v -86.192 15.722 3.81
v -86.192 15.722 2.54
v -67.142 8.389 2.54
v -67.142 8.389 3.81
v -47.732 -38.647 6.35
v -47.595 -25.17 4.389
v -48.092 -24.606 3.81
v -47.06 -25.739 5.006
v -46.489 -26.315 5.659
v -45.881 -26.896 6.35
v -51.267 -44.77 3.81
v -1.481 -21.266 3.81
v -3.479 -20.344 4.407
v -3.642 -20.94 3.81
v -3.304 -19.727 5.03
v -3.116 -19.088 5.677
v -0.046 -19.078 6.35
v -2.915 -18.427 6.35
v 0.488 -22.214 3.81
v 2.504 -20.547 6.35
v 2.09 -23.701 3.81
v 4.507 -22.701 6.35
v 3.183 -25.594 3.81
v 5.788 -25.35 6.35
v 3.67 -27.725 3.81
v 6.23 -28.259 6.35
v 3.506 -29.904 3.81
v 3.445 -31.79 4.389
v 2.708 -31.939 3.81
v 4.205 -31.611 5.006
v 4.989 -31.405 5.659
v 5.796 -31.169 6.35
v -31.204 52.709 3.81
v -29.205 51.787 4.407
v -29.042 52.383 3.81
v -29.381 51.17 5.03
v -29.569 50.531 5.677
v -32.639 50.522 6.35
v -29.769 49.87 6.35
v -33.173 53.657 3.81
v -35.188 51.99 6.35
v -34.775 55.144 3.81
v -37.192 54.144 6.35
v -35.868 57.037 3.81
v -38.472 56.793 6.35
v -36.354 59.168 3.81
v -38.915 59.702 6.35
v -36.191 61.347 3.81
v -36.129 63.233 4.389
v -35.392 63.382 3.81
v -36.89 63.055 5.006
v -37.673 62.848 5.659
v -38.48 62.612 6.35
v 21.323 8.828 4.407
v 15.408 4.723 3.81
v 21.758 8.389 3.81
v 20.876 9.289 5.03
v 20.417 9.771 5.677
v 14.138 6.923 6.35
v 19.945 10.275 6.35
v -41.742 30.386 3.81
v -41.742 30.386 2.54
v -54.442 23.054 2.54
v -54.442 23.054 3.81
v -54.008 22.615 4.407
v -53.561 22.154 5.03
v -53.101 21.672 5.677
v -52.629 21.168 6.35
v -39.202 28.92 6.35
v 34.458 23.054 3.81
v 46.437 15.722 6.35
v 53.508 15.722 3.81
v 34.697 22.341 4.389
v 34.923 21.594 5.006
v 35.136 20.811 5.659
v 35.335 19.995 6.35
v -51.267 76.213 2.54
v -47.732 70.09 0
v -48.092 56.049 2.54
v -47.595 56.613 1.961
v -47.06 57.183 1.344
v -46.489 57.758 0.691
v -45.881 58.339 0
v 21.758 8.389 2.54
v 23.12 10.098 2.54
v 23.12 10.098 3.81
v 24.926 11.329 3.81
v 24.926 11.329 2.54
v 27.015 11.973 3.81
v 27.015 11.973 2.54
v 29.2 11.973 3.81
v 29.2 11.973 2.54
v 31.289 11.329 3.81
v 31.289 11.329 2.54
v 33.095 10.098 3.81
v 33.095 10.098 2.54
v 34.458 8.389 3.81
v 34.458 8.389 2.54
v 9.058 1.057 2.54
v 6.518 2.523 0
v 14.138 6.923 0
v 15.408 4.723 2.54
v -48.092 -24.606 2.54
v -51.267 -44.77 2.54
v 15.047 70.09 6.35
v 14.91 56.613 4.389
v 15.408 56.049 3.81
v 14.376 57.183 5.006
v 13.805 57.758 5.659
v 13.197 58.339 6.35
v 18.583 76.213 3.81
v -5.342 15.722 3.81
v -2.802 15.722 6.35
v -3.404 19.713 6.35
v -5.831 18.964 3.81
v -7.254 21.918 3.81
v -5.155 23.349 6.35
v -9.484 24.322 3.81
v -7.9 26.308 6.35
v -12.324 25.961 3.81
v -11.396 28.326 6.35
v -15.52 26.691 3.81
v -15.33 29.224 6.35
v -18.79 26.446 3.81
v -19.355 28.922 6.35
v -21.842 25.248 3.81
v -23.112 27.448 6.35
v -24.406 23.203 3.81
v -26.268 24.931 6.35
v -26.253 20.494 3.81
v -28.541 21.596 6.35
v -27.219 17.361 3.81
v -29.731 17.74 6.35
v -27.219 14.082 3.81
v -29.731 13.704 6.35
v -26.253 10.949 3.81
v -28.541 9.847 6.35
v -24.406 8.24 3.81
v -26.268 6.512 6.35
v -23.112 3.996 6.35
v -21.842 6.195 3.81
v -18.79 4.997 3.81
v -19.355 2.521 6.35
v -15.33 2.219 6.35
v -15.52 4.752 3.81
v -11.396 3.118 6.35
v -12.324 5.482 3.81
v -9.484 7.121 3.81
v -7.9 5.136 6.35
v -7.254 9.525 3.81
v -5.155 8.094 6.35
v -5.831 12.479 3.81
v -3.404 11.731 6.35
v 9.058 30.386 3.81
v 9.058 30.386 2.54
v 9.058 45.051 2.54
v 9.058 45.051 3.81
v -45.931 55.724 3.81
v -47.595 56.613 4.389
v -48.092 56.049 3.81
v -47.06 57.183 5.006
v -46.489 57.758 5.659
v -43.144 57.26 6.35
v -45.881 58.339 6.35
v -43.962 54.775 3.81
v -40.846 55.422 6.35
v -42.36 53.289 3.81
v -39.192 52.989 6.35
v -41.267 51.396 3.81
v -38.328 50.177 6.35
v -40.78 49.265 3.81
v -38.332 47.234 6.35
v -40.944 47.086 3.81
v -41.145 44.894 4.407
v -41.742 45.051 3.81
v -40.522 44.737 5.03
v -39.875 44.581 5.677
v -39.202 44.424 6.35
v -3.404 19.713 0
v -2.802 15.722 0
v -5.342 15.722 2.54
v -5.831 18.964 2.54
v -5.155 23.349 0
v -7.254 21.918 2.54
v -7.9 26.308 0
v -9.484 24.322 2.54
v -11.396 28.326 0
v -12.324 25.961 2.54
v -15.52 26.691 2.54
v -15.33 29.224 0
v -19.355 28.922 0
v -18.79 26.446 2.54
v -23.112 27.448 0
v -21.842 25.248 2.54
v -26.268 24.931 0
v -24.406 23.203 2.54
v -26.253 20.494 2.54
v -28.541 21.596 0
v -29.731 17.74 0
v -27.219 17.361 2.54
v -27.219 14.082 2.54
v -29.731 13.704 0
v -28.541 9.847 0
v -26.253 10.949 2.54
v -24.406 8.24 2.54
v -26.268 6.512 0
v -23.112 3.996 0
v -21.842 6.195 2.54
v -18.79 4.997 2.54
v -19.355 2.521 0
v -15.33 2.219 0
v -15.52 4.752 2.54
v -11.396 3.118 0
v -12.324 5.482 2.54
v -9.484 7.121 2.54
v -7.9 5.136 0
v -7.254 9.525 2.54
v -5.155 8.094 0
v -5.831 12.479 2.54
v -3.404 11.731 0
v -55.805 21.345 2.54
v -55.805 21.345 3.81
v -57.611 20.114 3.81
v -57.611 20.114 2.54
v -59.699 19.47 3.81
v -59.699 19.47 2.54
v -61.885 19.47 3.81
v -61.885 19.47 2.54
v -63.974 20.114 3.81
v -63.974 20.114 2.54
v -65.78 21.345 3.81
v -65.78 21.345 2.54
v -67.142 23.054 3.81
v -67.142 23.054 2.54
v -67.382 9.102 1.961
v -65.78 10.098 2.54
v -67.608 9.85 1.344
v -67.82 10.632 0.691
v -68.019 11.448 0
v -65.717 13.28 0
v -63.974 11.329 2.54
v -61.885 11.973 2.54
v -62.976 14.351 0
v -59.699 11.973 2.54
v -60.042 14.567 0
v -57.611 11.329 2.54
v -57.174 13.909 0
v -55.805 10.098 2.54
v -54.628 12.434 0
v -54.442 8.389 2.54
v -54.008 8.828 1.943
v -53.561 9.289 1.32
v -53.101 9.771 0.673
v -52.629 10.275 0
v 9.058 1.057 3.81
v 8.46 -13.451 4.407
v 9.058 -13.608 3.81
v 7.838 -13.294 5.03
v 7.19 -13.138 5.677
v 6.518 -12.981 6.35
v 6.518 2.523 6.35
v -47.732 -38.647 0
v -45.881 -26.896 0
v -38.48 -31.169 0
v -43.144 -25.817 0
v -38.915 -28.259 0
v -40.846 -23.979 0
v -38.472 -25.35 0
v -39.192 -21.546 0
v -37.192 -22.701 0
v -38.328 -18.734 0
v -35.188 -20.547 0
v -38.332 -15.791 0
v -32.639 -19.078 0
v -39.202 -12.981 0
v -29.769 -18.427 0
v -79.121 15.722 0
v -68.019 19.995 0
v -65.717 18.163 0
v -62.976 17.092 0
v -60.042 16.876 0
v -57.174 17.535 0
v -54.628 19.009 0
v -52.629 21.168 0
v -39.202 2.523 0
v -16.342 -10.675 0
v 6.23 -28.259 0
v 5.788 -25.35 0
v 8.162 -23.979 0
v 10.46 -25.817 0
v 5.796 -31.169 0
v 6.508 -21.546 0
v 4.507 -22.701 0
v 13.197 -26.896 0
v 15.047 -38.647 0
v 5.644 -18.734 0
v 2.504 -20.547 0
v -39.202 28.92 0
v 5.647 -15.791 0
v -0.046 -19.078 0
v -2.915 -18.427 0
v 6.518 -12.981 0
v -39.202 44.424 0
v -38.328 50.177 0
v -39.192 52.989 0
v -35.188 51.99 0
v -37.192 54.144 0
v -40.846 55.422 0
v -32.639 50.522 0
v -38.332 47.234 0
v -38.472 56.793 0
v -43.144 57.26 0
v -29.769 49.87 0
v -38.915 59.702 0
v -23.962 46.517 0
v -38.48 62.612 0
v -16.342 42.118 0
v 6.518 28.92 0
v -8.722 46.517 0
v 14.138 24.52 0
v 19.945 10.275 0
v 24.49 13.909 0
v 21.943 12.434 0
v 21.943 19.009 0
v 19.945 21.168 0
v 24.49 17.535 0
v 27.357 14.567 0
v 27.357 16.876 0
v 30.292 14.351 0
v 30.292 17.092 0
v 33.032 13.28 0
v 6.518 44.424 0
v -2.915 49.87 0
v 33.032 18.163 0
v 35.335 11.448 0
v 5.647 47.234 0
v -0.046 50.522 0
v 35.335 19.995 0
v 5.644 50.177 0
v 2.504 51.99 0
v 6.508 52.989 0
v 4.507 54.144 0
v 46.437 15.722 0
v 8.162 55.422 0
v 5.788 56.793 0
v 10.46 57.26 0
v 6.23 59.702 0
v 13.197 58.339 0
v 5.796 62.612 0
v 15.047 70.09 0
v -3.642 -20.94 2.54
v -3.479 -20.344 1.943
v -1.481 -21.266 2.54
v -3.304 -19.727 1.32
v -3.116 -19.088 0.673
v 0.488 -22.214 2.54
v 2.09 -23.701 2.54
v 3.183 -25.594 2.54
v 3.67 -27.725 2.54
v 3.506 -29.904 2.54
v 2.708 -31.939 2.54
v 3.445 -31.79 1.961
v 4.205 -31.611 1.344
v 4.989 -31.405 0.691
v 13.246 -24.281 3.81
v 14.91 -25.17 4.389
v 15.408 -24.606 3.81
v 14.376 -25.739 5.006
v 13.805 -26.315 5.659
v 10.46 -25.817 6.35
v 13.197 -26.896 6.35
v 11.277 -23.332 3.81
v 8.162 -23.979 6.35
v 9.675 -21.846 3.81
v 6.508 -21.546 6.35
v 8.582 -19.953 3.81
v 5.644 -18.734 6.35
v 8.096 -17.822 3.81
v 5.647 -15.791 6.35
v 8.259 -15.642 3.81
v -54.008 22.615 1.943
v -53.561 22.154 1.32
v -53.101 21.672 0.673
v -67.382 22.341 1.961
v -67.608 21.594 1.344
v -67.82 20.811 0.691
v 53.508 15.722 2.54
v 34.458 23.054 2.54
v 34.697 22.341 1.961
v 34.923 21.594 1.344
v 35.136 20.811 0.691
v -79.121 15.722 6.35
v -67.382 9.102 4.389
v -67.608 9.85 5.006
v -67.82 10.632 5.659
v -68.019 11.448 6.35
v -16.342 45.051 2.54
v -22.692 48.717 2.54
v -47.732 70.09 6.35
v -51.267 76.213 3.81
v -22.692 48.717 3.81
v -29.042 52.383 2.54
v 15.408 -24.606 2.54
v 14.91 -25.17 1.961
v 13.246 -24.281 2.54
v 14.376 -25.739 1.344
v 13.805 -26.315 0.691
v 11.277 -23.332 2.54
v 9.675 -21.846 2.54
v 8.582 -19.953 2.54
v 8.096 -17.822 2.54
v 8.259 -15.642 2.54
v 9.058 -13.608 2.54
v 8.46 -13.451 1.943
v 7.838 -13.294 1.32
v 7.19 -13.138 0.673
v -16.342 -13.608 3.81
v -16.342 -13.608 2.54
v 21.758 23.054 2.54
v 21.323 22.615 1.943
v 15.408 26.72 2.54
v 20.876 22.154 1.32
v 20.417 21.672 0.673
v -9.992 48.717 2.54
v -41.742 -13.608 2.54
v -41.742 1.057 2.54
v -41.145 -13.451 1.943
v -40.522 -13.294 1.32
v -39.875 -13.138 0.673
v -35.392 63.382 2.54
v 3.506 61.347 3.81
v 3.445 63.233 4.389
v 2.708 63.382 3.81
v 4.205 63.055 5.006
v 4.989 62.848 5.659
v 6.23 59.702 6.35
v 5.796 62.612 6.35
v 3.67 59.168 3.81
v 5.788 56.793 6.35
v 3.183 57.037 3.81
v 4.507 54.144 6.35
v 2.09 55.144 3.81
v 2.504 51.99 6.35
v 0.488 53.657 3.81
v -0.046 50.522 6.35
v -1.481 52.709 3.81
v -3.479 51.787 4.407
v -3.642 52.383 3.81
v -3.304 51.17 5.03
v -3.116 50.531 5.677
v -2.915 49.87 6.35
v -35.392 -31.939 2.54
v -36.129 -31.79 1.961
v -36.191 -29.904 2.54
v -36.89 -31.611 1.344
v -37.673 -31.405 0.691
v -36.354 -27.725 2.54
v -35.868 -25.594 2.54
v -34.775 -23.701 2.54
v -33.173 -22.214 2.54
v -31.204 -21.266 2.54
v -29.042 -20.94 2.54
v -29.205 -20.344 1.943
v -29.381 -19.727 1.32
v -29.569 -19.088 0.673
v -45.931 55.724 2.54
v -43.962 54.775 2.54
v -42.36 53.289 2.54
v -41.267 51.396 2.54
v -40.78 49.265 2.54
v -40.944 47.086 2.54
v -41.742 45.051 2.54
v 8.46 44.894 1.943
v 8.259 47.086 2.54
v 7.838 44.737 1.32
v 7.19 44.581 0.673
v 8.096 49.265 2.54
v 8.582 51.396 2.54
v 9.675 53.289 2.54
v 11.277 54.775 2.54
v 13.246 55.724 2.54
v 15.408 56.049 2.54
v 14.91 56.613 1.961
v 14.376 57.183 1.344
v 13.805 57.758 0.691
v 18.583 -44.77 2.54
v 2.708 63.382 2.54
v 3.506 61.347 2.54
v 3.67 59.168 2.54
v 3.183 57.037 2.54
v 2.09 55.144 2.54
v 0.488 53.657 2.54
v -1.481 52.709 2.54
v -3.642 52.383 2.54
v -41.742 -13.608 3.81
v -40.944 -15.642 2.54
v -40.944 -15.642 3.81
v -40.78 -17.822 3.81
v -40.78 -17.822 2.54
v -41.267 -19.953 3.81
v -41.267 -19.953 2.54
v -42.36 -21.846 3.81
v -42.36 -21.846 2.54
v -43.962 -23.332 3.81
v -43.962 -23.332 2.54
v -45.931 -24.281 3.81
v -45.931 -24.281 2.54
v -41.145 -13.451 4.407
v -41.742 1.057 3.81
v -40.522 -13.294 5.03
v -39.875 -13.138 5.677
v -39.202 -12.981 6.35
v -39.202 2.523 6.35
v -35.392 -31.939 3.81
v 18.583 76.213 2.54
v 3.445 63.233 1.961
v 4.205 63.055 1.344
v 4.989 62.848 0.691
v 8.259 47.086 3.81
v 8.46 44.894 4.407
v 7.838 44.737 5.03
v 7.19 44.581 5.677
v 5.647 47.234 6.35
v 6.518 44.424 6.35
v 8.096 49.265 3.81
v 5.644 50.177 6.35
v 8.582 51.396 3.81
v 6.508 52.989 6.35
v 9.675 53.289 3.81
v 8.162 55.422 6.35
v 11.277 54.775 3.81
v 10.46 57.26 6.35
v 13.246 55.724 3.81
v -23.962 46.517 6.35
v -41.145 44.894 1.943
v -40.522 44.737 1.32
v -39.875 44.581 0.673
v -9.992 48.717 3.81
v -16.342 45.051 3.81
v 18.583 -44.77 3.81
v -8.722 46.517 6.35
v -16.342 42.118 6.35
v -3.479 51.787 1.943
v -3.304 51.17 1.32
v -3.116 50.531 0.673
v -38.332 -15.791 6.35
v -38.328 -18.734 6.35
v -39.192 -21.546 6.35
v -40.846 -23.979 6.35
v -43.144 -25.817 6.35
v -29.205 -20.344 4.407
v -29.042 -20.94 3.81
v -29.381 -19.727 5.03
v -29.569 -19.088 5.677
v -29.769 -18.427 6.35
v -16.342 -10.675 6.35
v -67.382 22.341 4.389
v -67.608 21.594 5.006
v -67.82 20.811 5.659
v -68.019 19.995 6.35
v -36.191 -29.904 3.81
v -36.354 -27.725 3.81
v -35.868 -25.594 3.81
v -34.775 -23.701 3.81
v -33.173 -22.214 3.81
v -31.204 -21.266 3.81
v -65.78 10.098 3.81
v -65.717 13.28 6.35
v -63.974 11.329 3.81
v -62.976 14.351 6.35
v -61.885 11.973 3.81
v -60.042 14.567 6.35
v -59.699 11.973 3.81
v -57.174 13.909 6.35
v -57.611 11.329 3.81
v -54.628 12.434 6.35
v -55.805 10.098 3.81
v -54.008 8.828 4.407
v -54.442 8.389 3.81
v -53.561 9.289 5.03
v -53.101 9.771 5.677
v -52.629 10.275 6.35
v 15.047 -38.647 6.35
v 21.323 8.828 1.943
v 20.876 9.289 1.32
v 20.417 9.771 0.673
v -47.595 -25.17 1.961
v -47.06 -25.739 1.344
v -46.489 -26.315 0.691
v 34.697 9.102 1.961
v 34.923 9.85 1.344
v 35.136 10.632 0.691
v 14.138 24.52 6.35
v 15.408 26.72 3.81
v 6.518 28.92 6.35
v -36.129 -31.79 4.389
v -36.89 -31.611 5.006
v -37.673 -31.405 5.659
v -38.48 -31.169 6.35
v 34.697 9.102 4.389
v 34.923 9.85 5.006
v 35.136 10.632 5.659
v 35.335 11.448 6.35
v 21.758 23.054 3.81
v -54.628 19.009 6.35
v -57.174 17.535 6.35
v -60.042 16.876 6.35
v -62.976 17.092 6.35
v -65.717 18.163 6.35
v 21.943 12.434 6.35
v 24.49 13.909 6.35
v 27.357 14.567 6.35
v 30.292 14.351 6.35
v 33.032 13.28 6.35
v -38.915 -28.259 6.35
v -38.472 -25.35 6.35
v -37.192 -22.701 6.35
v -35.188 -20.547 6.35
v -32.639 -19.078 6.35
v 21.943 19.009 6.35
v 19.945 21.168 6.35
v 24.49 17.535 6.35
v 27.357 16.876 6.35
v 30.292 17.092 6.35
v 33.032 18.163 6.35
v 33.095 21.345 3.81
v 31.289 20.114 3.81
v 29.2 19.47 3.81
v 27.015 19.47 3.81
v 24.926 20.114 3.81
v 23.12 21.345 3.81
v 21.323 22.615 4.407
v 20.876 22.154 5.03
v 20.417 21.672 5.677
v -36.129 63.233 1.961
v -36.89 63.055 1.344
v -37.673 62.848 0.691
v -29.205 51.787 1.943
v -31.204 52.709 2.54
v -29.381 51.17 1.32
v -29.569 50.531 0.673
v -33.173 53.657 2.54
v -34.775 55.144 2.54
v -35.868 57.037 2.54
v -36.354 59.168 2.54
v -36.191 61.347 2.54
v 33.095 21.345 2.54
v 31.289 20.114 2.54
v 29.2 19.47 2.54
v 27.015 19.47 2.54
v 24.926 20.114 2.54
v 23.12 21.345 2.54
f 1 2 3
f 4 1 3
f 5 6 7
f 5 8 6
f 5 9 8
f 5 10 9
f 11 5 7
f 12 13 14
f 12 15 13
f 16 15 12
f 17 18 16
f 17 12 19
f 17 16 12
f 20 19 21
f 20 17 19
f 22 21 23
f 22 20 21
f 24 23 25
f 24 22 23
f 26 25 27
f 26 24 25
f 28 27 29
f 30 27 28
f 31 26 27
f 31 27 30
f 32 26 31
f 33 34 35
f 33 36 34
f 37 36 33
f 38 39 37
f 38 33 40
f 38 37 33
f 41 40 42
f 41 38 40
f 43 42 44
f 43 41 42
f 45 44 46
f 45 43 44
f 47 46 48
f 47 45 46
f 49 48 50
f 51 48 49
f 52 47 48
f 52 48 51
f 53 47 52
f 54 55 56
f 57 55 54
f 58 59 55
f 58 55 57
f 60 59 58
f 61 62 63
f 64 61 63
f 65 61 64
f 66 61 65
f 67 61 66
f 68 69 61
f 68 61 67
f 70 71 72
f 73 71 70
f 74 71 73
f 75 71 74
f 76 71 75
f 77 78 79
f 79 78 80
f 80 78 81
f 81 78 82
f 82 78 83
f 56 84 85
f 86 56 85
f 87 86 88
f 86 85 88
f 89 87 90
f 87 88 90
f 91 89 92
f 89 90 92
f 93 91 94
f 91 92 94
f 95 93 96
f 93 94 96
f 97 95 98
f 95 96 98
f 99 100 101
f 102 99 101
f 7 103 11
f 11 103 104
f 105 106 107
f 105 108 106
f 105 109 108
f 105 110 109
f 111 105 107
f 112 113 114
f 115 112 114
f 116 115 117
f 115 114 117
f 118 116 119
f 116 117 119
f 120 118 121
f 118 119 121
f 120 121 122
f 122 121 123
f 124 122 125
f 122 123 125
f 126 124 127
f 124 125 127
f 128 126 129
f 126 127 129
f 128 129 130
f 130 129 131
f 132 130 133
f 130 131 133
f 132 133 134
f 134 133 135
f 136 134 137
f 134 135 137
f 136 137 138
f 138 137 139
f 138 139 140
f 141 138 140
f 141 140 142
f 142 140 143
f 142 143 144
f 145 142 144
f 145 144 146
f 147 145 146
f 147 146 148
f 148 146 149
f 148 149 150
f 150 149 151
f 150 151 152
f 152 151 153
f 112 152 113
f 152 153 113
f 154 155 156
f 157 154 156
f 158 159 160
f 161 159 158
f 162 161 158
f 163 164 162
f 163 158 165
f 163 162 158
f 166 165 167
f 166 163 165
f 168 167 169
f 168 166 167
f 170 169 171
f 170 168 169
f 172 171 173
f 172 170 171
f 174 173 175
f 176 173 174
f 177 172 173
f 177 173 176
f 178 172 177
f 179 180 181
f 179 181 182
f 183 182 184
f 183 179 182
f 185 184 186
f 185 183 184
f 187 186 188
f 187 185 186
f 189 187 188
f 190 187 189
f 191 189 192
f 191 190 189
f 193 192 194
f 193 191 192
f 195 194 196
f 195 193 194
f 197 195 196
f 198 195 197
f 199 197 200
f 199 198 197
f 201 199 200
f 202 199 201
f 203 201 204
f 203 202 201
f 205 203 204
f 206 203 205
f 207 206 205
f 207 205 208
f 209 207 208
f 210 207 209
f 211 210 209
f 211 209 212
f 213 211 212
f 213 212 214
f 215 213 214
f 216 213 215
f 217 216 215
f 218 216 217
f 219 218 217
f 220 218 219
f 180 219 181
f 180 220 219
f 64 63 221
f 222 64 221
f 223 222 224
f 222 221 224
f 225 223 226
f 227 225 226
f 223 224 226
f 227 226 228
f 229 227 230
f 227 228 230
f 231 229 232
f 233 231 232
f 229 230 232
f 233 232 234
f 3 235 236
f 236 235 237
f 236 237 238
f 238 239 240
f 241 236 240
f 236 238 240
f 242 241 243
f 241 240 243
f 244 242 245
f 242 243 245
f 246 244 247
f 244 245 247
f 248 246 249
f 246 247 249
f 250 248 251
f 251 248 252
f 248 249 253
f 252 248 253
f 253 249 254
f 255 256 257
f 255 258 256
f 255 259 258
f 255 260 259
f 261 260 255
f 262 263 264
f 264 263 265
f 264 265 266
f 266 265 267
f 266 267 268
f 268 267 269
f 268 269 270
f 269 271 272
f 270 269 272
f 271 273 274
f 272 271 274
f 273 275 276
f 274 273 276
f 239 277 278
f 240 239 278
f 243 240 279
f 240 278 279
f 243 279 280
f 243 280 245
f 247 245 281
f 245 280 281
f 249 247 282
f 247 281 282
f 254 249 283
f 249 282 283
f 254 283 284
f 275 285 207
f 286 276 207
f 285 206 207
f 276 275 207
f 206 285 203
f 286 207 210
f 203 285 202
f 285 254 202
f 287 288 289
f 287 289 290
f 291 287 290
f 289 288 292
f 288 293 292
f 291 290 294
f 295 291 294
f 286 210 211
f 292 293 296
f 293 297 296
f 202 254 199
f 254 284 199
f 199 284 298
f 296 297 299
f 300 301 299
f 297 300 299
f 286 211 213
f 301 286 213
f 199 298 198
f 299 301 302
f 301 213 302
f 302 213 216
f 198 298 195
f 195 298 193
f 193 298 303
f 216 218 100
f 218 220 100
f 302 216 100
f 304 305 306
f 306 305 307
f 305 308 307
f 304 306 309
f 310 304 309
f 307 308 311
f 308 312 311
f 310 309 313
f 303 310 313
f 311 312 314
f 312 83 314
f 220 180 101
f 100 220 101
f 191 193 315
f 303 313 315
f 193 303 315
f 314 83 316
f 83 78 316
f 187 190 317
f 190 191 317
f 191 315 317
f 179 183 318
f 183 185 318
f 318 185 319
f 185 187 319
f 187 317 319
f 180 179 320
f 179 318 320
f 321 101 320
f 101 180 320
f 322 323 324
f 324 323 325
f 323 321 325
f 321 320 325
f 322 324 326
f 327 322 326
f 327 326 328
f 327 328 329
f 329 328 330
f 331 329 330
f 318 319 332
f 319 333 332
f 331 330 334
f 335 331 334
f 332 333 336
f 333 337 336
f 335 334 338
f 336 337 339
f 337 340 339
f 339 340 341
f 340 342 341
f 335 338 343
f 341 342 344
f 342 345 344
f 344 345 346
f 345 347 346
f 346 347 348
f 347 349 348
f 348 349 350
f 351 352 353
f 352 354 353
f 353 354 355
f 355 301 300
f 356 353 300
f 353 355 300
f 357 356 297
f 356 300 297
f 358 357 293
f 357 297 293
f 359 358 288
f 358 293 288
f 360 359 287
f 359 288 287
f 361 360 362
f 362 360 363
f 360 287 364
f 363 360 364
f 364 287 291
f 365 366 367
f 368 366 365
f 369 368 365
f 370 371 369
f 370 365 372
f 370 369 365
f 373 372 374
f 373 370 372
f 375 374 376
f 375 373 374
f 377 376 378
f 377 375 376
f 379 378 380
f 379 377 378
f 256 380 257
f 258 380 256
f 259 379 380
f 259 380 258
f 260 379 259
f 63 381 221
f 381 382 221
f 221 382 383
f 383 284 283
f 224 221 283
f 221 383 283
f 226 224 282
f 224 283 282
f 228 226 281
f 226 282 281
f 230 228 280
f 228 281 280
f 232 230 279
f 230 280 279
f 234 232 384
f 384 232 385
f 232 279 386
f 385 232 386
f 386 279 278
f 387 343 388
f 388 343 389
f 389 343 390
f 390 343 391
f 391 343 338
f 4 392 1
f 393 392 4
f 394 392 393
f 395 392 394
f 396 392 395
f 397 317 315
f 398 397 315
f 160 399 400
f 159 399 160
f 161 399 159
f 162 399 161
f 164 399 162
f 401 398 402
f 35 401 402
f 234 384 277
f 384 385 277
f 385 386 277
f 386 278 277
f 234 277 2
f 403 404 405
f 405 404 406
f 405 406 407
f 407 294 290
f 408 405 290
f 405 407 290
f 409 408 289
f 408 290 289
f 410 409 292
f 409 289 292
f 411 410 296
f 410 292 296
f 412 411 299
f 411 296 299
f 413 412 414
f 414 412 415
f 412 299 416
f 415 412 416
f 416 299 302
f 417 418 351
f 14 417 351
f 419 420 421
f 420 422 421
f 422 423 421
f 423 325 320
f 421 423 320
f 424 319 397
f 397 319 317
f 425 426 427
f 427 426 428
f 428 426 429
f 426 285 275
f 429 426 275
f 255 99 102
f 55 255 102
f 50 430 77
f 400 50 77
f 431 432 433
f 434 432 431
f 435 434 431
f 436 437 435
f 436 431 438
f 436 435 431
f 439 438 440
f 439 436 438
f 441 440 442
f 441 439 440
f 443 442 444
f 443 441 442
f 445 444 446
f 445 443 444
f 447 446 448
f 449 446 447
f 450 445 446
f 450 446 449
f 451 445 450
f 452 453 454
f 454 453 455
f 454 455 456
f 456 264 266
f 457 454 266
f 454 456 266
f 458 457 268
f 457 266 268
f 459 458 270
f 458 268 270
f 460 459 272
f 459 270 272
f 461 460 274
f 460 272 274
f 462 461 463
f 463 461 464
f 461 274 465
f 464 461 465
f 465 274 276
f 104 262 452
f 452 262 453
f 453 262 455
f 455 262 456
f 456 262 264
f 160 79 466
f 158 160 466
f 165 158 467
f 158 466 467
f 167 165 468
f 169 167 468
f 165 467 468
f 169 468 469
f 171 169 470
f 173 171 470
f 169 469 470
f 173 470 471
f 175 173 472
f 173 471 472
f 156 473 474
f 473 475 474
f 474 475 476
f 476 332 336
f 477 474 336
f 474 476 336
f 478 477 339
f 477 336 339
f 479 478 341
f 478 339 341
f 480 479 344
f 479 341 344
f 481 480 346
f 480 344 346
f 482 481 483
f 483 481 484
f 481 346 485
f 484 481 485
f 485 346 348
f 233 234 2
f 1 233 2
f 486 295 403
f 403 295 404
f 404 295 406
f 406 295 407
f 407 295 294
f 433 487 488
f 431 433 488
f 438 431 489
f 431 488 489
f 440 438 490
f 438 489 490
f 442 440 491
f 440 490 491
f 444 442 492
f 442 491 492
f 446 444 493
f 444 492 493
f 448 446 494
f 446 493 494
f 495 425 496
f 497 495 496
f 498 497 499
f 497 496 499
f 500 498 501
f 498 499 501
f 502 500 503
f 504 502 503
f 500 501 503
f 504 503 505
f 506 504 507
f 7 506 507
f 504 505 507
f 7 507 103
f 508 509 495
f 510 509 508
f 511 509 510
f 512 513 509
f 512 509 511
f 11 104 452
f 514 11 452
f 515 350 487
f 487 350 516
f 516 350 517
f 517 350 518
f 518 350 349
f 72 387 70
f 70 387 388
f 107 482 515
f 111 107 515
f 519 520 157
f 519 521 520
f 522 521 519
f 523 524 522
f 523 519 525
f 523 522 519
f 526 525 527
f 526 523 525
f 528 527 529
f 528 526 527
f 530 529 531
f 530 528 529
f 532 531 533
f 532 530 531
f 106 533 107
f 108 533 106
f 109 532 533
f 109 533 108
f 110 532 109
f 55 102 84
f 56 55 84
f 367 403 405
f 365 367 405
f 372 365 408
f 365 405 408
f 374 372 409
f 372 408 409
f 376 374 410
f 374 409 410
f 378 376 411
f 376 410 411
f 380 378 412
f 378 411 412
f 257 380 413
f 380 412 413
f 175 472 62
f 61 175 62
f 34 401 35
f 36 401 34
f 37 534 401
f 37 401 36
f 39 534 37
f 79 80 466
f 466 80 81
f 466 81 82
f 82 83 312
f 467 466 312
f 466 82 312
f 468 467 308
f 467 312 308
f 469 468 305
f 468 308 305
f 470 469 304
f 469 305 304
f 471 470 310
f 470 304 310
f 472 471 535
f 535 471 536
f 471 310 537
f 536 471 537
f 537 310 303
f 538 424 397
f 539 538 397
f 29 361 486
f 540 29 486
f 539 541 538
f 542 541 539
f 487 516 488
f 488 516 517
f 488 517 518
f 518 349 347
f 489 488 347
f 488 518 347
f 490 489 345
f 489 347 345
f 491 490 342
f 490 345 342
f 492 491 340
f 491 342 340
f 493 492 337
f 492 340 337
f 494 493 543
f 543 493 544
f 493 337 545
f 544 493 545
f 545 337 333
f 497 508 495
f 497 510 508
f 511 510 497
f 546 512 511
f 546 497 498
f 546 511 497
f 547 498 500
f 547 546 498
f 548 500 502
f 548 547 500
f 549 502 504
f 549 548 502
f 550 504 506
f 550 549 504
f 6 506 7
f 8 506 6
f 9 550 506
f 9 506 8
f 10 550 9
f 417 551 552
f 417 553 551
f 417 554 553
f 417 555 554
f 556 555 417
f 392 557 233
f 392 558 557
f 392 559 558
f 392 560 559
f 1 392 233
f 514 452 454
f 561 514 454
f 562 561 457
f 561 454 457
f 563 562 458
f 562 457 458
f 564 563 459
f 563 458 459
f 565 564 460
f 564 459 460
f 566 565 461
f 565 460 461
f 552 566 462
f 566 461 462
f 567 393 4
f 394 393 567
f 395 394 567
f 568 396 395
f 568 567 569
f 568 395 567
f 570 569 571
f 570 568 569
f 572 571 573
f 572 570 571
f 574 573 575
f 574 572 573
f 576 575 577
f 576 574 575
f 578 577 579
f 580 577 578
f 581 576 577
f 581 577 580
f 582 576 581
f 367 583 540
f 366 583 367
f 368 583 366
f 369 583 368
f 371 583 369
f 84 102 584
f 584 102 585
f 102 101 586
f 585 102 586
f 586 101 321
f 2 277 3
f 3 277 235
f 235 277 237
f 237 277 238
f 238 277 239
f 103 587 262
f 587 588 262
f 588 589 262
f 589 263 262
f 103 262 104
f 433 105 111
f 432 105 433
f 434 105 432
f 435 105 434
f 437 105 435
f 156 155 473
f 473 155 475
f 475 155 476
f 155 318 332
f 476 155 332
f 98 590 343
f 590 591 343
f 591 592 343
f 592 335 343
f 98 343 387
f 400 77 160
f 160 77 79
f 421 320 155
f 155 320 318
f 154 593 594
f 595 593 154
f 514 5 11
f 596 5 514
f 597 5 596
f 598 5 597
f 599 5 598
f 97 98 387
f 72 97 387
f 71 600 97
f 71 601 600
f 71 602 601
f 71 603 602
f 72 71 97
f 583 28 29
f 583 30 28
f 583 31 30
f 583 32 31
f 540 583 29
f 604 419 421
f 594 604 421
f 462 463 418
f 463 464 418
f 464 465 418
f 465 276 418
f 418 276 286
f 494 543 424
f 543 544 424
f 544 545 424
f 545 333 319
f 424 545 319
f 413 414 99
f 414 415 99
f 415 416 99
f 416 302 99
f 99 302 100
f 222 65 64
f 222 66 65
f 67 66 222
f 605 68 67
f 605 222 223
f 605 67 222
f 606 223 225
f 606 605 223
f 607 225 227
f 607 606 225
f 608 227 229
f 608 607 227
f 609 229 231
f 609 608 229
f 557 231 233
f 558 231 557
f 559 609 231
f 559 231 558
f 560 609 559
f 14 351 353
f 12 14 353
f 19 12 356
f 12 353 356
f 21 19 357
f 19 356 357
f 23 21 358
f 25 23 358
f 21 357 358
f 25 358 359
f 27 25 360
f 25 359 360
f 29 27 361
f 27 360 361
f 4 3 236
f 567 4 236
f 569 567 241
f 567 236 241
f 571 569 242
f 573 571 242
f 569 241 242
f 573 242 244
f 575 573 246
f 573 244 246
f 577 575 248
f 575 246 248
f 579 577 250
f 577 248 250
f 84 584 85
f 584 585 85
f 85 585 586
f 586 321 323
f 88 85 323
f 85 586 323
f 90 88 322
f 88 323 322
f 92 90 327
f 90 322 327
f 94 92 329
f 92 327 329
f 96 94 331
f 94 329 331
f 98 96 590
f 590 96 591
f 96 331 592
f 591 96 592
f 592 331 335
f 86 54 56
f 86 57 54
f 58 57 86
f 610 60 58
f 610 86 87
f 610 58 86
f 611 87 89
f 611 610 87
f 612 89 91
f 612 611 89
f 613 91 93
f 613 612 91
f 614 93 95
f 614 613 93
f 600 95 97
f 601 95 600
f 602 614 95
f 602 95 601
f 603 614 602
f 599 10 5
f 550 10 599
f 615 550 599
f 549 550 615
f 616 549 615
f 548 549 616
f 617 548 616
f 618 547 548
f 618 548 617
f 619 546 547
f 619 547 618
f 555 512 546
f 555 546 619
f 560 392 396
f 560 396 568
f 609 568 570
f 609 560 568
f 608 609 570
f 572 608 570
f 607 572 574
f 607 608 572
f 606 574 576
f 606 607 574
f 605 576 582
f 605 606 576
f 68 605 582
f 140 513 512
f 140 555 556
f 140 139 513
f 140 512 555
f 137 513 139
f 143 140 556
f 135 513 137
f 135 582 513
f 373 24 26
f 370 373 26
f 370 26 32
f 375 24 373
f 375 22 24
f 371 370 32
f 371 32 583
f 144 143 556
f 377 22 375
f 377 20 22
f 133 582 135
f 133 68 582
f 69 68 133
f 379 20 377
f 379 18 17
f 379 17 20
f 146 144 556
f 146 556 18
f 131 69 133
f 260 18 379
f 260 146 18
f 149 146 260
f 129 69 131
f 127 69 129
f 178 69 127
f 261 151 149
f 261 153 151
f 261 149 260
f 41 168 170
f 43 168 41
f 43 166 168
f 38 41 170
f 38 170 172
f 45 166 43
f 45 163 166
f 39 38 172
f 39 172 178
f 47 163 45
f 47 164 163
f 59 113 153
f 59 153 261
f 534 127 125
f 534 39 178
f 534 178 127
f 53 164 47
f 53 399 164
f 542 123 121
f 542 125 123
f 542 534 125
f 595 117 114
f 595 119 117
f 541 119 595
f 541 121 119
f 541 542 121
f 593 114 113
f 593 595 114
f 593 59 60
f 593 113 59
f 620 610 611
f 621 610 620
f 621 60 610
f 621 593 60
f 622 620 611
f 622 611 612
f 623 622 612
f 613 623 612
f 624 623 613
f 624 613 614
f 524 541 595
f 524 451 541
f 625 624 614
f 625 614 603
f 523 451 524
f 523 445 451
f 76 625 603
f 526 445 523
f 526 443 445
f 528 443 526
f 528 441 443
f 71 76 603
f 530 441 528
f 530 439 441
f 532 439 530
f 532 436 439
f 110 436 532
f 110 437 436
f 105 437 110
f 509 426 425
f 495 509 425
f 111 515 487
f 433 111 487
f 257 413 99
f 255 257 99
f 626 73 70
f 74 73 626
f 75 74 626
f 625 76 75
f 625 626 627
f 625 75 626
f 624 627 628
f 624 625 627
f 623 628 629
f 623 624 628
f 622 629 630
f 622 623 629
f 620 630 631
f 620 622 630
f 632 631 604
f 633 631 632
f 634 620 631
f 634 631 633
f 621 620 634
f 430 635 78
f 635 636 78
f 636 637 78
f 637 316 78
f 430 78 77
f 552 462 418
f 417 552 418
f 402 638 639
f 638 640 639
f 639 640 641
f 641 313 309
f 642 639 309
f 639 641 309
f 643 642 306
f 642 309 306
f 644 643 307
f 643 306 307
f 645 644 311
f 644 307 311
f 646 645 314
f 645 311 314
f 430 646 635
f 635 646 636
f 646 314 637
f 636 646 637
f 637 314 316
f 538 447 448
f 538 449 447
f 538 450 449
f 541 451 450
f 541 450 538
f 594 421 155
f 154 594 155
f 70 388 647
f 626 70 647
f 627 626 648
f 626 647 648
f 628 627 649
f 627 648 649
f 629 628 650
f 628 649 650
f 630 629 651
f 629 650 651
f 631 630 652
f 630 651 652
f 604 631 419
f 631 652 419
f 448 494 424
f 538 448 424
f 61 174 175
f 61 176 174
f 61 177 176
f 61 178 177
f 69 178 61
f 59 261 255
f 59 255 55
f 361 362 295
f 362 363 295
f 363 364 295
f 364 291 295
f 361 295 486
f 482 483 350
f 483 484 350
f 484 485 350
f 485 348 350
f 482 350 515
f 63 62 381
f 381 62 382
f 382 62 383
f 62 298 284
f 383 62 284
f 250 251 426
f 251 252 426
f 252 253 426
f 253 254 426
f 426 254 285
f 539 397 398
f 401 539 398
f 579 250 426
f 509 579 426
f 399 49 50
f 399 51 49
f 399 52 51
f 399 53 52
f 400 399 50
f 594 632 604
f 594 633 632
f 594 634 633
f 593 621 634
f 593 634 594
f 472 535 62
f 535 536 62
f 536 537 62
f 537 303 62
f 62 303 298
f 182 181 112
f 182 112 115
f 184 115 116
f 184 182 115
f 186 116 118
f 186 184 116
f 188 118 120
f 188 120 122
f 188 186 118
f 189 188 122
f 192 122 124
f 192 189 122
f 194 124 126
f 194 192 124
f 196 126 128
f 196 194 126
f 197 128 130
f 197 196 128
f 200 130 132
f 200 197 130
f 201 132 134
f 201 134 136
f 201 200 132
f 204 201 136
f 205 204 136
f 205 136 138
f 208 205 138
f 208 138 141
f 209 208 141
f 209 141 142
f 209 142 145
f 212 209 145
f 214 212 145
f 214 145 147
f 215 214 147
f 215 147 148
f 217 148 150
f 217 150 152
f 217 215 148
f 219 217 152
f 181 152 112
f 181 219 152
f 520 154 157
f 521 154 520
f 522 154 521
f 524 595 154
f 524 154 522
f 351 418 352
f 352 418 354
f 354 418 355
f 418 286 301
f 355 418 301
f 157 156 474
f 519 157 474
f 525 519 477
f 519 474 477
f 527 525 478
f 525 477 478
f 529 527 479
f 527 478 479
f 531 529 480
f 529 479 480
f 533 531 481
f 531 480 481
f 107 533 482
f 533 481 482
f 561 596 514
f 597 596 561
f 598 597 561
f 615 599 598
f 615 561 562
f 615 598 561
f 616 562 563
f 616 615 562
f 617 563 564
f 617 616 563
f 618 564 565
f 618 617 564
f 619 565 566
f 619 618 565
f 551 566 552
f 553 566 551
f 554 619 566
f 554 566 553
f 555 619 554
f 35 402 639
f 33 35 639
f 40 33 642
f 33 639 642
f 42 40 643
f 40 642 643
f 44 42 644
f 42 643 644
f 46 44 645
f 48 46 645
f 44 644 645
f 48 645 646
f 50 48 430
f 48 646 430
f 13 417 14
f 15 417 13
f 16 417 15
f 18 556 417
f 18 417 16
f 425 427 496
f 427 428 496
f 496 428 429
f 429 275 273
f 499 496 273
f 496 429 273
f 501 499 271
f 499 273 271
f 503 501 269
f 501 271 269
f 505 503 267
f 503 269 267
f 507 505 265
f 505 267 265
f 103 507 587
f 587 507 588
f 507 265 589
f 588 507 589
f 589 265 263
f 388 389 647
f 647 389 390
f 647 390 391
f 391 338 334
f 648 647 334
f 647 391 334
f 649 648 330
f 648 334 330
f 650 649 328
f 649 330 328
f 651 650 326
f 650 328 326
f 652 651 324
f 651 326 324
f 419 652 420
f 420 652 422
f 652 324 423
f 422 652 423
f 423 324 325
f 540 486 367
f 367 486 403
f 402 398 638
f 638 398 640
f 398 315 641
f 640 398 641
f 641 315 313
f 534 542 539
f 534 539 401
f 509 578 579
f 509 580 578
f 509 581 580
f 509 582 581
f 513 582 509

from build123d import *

# Parameters (mm, degrees)
F0_R     = 11
F1_DEPTH = 6.35
F2_SIZE  = 2.54


with BuildPart() as f1:
    # F0 (on Top) → F1 (new body)
    with BuildSketch(Plane.XY):
        Polygon((-41.7423269987, 30.386245353), (-16.3423269987, 45.0509421904), (-22.6923274444, 48.717116657), (-29.0423278901, 52.3832911237), (-41.7423269987, 45.0509425335), (-41.7423269987, 37.7185939432), align=None)
        Polygon((9.0576730013, 1.0568516781), (9.0576730013, 30.386245353), (-16.3423269987, 45.0509421904), (-41.7423269987, 30.386245353), (-41.7423269987, 1.0568516781), (-16.3423269987, -13.6078451593), align=None)
        with Locations((-16.3423269987, 15.7215485155)):
            Circle(F0_R, mode=Mode.SUBTRACT)
        Polygon((-41.7423269987, 1.0568516781), (-41.7423269987, 30.386245353), (-48.092324038, 26.720072853), (-54.4423210773, 23.053900353), (-54.4423210773, 8.3891966781), (-48.092324038, 4.7230241781), align=None)
        Polygon((-22.692324038, -17.2740176593), (-16.3423269987, -13.6078451593), (-41.7423269987, 1.0568516781), (-41.7423269987, -6.2754933219), (-41.7423269987, -13.6078383219), (-29.0423210773, -20.9401901593), align=None)
        Polygon((9.0576730013, -6.2754933219), (9.0576730013, 1.0568516781), (-16.3423269987, -13.6078451593), (-9.9923299594, -17.2740176593), (-3.6423329201, -20.9401901593), (9.0576730013, -13.6078383219), align=None)
        Polygon((15.4076717053, 26.7200718918), (9.0576730013, 30.386245353), (9.0576730013, 1.0568516781), (15.4076710394, 4.7230247548), (21.7576690776, 8.3891978315), (21.7576704094, 23.0538984307), align=None)
        Polygon((-16.3423269987, 45.0509421904), (9.0576730013, 30.386245353), (9.0576730013, 37.7185939432), (9.0576730013, 45.0509425335), (-3.6423261074, 52.3832911237), (-9.992326553, 48.717116657), align=None)
        Polygon((-35.3923274444, 63.381813666), (-51.2673278158, 76.2134228412), (-41.7423271473, 59.7156392851), align=None)
        Polygon((-41.7423271473, 59.7156392851), (-51.2673278158, 76.2134228412), (-48.0923268502, 56.0494649042), align=None)
        with BuildLine():
            Line((-41.7423269987, 45.0509425335), (-29.0423278901, 52.3832911237))
            ThreePointArc((-29.0423278901, 52.3832911237), (-35.3923274939, 56.0494655046), (-35.3923274444, 63.381813666))
            Line((-35.3923274444, 63.381813666), (-41.7423271473, 59.7156392851))
            Line((-41.7423271473, 59.7156392851), (-48.0923268502, 56.0494649042))
            ThreePointArc((-48.0923268502, 56.0494649042), (-41.7423271473, 52.3832906948), (-41.7423269987, 45.0509425335))
        make_face()
        Polygon((-67.1423210773, 23.053900353), (-86.1923210773, 15.7215485155), (-67.1423210773, 15.7215485155), align=None)
        Polygon((-67.1423210773, 15.7215485155), (-86.1923210773, 15.7215485155), (-67.1423210773, 8.3891966781), align=None)
        with BuildLine():
            Line((-54.4423210773, 8.3891966781), (-54.4423210773, 23.053900353))
            ThreePointArc((-54.4423210773, 23.053900353), (-60.7923210773, 19.3877261436), (-67.1423210773, 23.053900353))
            Line((-67.1423210773, 23.053900353), (-67.1423210773, 15.7215485155))
            Line((-67.1423210773, 15.7215485155), (-67.1423210773, 8.3891966781))
            ThreePointArc((-67.1423210773, 8.3891966781), (-60.7923210773, 12.0553708875), (-54.4423210773, 8.3891966781))
        make_face()
        with BuildLine():
            ThreePointArc((-35.3923210773, -31.9387127874), (-35.3923181166, -24.606366078), (-29.0423210773, -20.9401901593))
            Line((-29.0423210773, -20.9401901593), (-41.7423269987, -13.6078383219))
            ThreePointArc((-41.7423269987, -13.6078383219), (-41.7423284791, -20.9401858859), (-48.0923269987, -24.6063609499))
            Line((-48.0923269987, -24.6063609499), (-41.742324038, -28.2725368686))
            Line((-41.742324038, -28.2725368686), (-35.3923210773, -31.9387127874))
        make_face()
        Polygon((-48.0923269987, -24.6063609499), (-51.267324038, -44.7703208107), (-41.742324038, -28.2725368686), align=None)
        Polygon((-51.267324038, -44.7703208107), (-35.3923210773, -31.9387127874), (-41.742324038, -28.2725368686), align=None)
        Polygon((18.5826774423, -44.7703233748), (15.4076848441, -24.6063609499), (9.0576774423, -28.2725394327), align=None)
        Polygon((2.7076700406, -31.9387179154), (18.5826774423, -44.7703233748), (9.0576774423, -28.2725394327), align=None)
        with BuildLine():
            ThreePointArc((15.4076848441, -24.6063609499), (9.0576744816, -20.9401927233), (9.0576730013, -13.6078383219))
            Line((9.0576730013, -13.6078383219), (-3.6423329201, -20.9401901593))
            ThreePointArc((-3.6423329201, -20.9401901593), (2.7076700406, -24.606366078), (2.7076700406, -31.9387179154))
            Line((2.7076700406, -31.9387179154), (9.0576774423, -28.2725394327))
            Line((9.0576774423, -28.2725394327), (15.4076848441, -24.6063609499))
        make_face()
        Polygon((34.457666414, 8.3891966781), (53.5076670799, 15.7215485155), (34.4576670799, 15.7215485155), align=None)
        with BuildLine():
            ThreePointArc((34.4576677458, 23.053900353), (28.1076696325, 19.3877274892), (21.7576704094, 23.0538984307))
            Line((21.7576704094, 23.0538984307), (21.7576690776, 8.3891978315))
            ThreePointArc((21.7576690776, 8.3891978315), (28.1076680788, 12.0553691574), (34.457666414, 8.3891966781))
            Line((34.457666414, 8.3891966781), (34.4576670799, 15.7215485155))
            Line((34.4576670799, 15.7215485155), (34.4576677458, 23.053900353))
        make_face()
        Polygon((34.4576670799, 15.7215485155), (53.5076670799, 15.7215485155), (34.4576677458, 23.053900353), align=None)
        with BuildLine():
            Line((-3.6423261074, 52.3832911237), (9.0576730013, 45.0509425335))
            ThreePointArc((9.0576730013, 45.0509425335), (9.0576733974, 52.3832904375), (15.4076728527, 56.0494645611))
            Line((15.4076728527, 56.0494645611), (9.0576723328, 59.7156394138))
            Line((9.0576723328, 59.7156394138), (2.7076718128, 63.3818142664))
            ThreePointArc((2.7076718128, 63.3818142664), (2.7076727042, 56.0494663623), (-3.6423261074, 52.3832911237))
        make_face()
        Polygon((9.0576723328, 59.7156394138), (18.5826730013, 76.2134229699), (2.7076718128, 63.3818142664), align=None)
        Polygon((9.0576723328, 59.7156394138), (15.4076728527, 56.0494645611), (18.5826730013, 76.2134229699), align=None)
    extrude(amount=F1_DEPTH)

    # F2
    f2_edges = [f1.edges().sort_by_distance(p)[0] for p in [
        (-41.742327, 37.718594, 6.35),
        (-48.092324, 26.720073, 6.35),
        (-60.792321, 19.387726, 6.35),
        (-76.667321, 19.387724, 6.35),
        (-76.667321, 12.055373, 6.35),
        (-60.792321, 12.055371, 6.35),
        (-48.092324, 4.723024, 6.35),
        (-41.742327, -6.275493, 6.35),
        (-41.742328, -20.940186, 6.35),
        (-49.679826, -34.688341, 6.35),
        (-43.329823, -38.354517, 6.35),
        (-35.392318, -24.606366, 6.35),
        (-22.692324, -17.274018, 6.35),
        (-9.99233, -17.274018, 6.35),
        (2.70767, -24.606366, 6.35),
        (10.645174, -38.354521, 6.35),
        (16.995181, -34.688342, 6.35),
        (9.057674, -20.940193, 6.35),
        (9.057673, -6.275493, 6.35),
        (15.407671, 4.723025, 6.35),
        (28.107668, 12.055369, 6.35),
        (43.982667, 12.055373, 6.35),
        (43.982667, 19.387724, 6.35),
        (28.10767, 19.387727, 6.35),
        (15.407672, 26.720072, 6.35),
        (9.057673, 37.718594, 6.35),
        (9.057673, 52.38329, 6.35),
        (16.995173, 66.131444, 6.35),
        (10.645172, 69.797619, 6.35),
        (2.707673, 56.049466, 6.35),
        (-9.992327, 48.717117, 6.35),
        (-22.692327, 48.717117, 6.35),
        (-35.392327, 56.049466, 6.35),
        (-43.329828, 69.797618, 6.35),
        (-49.679827, 66.131444, 6.35),
        (-41.742327, 52.383291, 6.35),
        (-27.342327, 15.721549, 6.35),
        (-41.742327, 37.718594, 0),
        (-48.092324, 26.720073, 0),
        (-60.792321, 19.387726, 0),
        (-76.667321, 19.387724, 0),
        (-76.667321, 12.055373, 0),
        (-60.792321, 12.055371, 0),
        (-48.092324, 4.723024, 0),
        (-41.742327, -6.275493, 0),
        (-41.742328, -20.940186, 0),
        (-49.679826, -34.688341, 0),
        (-43.329823, -38.354517, 0),
        (-35.392318, -24.606366, 0),
        (-22.692324, -17.274018, 0),
        (-9.99233, -17.274018, 0),
        (2.70767, -24.606366, 0),
        (10.645174, -38.354521, 0),
        (16.995181, -34.688342, 0),
        (9.057674, -20.940193, 0),
        (9.057673, -6.275493, 0),
        (15.407671, 4.723025, 0),
        (28.107668, 12.055369, 0),
        (43.982667, 12.055373, 0),
        (43.982667, 19.387724, 0),
        (28.10767, 19.387727, 0),
        (15.407672, 26.720072, 0),
        (9.057673, 37.718594, 0),
        (9.057673, 52.38329, 0),
        (16.995173, 66.131444, 0),
        (10.645172, 69.797619, 0),
        (2.707673, 56.049466, 0),
        (-9.992327, 48.717117, 0),
        (-22.692327, 48.717117, 0),
        (-35.392327, 56.049466, 0),
        (-43.329828, 69.797618, 0),
        (-49.679827, 66.131444, 0),
        (-41.742327, 52.383291, 0),
        (-27.342327, 15.721549, 0),
    ]]
    chamfer(f2_edges, length=F2_SIZE)


solid = f1.part
